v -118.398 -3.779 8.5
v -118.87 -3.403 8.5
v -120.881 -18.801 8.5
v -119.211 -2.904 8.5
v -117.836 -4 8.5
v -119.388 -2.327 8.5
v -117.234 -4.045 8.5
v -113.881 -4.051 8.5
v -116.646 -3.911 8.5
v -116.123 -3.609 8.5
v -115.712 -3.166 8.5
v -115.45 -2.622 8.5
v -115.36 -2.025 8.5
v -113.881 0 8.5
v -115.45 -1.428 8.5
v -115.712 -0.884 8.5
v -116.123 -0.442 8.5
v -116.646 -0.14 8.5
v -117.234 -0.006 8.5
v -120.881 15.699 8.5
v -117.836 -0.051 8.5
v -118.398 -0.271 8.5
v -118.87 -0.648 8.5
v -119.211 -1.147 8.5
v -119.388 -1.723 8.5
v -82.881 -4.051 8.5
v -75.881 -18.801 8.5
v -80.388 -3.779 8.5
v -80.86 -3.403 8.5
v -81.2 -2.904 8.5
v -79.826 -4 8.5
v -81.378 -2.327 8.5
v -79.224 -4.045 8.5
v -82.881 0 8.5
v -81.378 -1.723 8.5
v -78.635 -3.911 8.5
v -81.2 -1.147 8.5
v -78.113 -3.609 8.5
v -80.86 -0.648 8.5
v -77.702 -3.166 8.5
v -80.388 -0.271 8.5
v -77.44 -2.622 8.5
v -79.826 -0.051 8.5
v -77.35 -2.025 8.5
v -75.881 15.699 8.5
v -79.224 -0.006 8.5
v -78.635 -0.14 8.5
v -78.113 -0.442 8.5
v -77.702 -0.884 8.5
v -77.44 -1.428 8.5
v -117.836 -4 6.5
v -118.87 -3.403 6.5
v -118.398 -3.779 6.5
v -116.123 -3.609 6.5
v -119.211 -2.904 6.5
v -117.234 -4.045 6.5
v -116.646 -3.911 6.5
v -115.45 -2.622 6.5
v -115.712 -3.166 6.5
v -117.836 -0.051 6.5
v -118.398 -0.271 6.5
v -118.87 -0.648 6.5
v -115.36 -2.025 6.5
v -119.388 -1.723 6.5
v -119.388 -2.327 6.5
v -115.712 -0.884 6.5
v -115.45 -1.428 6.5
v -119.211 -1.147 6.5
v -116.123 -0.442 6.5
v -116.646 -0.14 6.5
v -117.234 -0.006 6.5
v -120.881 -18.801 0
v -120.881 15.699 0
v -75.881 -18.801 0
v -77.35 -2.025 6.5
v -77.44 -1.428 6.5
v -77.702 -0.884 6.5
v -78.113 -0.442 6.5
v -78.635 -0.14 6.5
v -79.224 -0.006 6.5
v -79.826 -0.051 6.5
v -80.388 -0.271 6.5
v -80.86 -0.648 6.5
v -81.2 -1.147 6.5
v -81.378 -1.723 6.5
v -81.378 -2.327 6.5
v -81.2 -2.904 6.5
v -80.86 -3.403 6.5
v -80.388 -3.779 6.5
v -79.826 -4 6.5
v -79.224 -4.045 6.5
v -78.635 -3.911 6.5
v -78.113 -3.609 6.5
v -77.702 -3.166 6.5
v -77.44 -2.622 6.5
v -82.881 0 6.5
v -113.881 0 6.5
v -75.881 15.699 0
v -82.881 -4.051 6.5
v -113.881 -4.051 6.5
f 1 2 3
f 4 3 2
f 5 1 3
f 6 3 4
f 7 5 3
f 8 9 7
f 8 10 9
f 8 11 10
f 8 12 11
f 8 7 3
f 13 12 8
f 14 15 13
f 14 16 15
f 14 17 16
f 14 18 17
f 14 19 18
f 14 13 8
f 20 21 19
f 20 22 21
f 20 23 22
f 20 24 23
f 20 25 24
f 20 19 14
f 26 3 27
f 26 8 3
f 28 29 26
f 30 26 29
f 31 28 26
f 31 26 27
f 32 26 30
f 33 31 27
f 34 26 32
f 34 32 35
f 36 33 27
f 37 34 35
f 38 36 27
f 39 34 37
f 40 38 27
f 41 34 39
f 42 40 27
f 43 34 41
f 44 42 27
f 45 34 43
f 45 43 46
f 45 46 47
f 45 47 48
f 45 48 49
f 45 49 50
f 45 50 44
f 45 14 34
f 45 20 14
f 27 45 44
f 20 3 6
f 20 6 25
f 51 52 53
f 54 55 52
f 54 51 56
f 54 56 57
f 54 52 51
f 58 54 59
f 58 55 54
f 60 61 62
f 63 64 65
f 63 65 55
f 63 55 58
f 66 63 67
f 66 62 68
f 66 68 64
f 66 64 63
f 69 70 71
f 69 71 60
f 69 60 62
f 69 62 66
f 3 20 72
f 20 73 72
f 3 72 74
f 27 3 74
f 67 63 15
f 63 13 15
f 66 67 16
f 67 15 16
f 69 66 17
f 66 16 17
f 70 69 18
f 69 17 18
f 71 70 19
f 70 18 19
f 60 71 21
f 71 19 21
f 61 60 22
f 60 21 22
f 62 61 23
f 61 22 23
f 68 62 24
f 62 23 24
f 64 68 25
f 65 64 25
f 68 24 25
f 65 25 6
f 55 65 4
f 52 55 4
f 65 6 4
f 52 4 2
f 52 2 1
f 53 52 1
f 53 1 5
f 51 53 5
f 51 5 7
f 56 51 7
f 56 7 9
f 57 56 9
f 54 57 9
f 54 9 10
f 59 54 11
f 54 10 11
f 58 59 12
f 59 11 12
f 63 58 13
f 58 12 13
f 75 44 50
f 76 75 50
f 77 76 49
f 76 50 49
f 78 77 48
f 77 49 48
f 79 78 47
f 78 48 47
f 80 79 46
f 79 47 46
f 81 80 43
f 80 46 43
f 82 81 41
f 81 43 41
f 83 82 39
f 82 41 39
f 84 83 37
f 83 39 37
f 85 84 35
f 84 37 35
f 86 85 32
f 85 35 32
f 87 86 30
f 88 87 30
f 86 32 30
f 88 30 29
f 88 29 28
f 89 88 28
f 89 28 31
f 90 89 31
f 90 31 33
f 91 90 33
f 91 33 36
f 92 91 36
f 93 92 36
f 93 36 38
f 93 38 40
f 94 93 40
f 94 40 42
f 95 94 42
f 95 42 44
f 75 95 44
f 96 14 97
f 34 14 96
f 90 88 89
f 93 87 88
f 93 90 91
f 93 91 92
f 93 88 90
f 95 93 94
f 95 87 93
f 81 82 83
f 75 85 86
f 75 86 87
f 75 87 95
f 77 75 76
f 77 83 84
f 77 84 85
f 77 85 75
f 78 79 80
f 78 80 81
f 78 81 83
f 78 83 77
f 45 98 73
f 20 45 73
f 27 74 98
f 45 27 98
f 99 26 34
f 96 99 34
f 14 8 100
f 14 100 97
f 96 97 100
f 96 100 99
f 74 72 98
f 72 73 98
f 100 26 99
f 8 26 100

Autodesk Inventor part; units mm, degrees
ref_plane "YZ Plane" through (0, 0, 0) normal (1, 0, 0) x (0, 1, 0)
ref_plane "XZ Plane" through (0, 0, 0) normal (0, 1, 0) x (-1, 0, 0)
ref_plane "XY Plane" through (0, 0, 0) normal (0, 0, 1) x (1, 0, 0)
ref_plane "Work Plane1" through (0, 0, 0) normal (0, 0, 1) x (1, 0, 0)
sketch "Sketch1" plane through (0, 0, 0) normal (0, 0, 1) x (1, 0, 0)
  line L0 (-75.8806, 15.6994) -> (-120.8806, 15.6994)
  line L1 (-120.8806, 15.6994) -> (-120.8806, -18.8006)
  line L2 (-120.8806, -18.8006) -> (-75.8806, -18.8006)
  line L3 (-75.8806, -18.8006) -> (-75.8806, 15.6994)
  point P0 (0, 0)
  dimension "d0" = 34.5
  dimension "d1" = 45
extrude "Extrusion1" add sketch "Sketch1" along normal blind 8.5
sketch "Sketch2" plane through (0, 0, 8.5) normal (0, 0, 1) x (1, 0, 0)
  line L0 (-120.8806, 15.6994) -> (-120.8806, -18.8006) projected
  line L1 (-120.8806, -1.5506) -> (-113.8806, -1.5506)
  line L2 (-113.8806, -1.5506) -> (-82.8806, -1.5506)
  line L3 (-82.8806, -1.5506) -> (-82.8806, -4.0506)
  line L4 (-82.8806, -1.5506) -> (-82.8806, 0.9494)
  line L5 (-82.8806, -4.0506) -> (-113.8806, -4.0506)
  line L6 (-113.8806, -4.0506) -> (-113.8806, 0)
  line L7 (-113.8806, 0) -> (-82.8806, 0)
  line L8 (-82.8806, 0) -> (-82.8806, -4.0506)
  line L9 (-82.8806, -4.0506) -> (-113.8806, -4.0506)
  line L10 (-113.8806, -4.0506) -> (-113.8806, 0)
  line L11 (-113.8806, 0) -> (-82.8806, 0)
  line L12 (-82.8806, 0) -> (-82.8806, -4.0506)
  point P0 (0, 0)
  dimension "d4" = 7
  dimension "d5" = 31
  dimension "d6" = 2.5
  dimension "d7" = 2.5
extrude "Extrusion2" cut sketch "Sketch2" against normal blind 2
sketch "Sketch3" plane through (0, 0, 8.5) normal (0, 0, 1) x (1, 0, 0)
  line L0 (-82.8806, 0) -> (-82.8806, -4.0506) projected
  line L1 (-113.8806, 0) -> (-82.8806, 0) projected
  line L2 (-113.8806, -4.0506) -> (-113.8806, 0) projected
  line L3 (-82.8806, -4.0506) -> (-113.8806, -4.0506) projected
  line L4 (-75.8806, -18.8006) -> (-75.8806, 15.6994) projected
  line L5 (-82.8806, -2.0253) -> (-79.3754, -2.0253)
  line L6 (-113.8806, -2.0253) -> (-117.3858, -2.0253)
  circle A0 centre (-117.3858, -2.0253) radius 2.0253
  circle A1 centre (-79.3754, -2.0253) radius 2.0253
  point P0 (0, 0)
  dimension "d11" = 3.5052
  dimension "d12" = 3.5052
extrude "Extrusion3" cut sketch "Sketch3" against normal blind 2 contours A1 | A0
properties part number "Breadboard"
